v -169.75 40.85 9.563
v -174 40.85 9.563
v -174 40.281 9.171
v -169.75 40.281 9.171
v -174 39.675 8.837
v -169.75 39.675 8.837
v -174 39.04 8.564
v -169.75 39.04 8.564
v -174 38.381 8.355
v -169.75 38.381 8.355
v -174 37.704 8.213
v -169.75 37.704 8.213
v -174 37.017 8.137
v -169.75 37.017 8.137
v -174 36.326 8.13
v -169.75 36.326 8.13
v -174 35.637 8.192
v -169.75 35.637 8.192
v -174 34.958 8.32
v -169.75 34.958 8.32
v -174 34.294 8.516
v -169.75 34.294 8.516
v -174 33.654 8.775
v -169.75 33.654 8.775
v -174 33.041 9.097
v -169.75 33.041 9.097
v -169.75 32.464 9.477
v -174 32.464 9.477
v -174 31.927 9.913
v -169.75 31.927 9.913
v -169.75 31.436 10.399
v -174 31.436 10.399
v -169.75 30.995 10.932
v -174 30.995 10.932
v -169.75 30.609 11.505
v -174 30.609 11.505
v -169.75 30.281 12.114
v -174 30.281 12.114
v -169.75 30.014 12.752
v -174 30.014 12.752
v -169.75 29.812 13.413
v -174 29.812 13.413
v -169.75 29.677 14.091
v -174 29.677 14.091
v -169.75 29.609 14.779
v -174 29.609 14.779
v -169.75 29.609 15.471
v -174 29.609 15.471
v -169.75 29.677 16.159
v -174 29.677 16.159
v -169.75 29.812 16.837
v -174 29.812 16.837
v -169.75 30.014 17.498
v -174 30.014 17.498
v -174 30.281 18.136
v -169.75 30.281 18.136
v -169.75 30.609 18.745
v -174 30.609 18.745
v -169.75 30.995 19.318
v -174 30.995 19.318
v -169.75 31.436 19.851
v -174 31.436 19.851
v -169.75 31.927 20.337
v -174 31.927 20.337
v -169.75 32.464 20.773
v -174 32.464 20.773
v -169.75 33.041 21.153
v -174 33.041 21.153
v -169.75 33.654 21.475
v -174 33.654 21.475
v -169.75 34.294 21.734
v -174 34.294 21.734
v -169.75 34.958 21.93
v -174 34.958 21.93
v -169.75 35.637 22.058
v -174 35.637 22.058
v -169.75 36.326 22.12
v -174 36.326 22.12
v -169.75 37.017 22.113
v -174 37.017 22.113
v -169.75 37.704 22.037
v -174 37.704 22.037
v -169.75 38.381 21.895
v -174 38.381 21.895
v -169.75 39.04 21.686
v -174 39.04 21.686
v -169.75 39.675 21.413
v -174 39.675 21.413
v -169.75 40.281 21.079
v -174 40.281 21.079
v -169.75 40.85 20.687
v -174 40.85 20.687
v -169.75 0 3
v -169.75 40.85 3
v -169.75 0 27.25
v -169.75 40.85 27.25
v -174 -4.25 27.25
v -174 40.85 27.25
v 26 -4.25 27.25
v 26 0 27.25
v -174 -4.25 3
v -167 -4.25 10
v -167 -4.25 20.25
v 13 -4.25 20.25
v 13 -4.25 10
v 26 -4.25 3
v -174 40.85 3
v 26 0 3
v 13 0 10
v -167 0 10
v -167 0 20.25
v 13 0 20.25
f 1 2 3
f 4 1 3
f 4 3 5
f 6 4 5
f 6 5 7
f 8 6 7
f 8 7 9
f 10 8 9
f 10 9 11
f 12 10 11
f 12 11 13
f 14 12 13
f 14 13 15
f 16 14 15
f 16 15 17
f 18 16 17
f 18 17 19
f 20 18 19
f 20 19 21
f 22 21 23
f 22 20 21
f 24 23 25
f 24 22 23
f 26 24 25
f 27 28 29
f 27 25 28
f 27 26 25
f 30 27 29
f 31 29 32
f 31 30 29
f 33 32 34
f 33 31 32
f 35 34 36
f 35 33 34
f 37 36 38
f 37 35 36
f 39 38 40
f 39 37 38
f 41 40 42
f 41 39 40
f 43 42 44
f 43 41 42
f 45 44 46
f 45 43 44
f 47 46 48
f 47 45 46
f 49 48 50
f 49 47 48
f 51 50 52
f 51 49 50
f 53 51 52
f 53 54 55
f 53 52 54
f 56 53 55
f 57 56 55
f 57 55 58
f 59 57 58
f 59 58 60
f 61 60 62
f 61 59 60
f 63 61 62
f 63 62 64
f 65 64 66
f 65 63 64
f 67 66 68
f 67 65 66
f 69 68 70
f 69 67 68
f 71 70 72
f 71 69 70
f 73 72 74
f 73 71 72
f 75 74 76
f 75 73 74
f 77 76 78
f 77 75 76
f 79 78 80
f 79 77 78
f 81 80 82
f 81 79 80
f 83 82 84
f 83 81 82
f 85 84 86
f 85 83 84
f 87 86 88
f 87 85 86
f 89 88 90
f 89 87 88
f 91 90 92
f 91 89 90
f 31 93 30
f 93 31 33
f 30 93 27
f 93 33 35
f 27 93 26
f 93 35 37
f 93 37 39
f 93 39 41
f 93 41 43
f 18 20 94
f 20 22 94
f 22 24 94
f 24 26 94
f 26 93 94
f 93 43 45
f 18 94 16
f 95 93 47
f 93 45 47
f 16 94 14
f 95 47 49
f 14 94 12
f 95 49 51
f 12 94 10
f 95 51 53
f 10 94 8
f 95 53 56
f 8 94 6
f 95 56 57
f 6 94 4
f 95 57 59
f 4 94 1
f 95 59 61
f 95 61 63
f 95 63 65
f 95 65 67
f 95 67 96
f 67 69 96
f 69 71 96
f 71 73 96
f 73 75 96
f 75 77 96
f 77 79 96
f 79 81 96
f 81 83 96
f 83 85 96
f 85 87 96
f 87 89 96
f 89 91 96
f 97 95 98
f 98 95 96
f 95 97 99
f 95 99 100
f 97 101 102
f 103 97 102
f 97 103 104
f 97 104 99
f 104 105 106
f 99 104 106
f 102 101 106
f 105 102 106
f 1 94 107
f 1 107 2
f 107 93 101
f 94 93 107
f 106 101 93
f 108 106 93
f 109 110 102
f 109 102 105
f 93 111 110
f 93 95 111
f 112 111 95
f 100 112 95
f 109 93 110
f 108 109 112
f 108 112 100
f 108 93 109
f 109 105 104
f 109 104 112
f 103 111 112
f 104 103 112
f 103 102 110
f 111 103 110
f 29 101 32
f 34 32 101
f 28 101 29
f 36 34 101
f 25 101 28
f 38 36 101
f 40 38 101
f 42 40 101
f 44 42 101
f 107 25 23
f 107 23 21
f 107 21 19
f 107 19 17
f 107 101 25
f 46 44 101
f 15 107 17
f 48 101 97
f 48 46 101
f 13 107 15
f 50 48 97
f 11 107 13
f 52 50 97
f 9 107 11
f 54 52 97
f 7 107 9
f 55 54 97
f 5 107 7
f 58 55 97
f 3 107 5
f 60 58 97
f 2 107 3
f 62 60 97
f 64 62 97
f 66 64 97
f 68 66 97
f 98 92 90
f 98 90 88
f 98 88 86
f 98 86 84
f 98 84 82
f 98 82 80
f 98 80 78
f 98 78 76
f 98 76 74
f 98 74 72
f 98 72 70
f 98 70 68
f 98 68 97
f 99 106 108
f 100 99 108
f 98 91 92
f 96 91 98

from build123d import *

# Parameters (mm, degrees)
CYLINDER026_R     = 7
CYLINDER026_DEPTH = 64
BOX019_W          = 24.25
BOX019_H          = 40.85
BOX019_DEPTH      = 4.25
BOX026_W          = 180
BOX026_H          = 4.25
BOX026_DEPTH      = 10.25
BOX017_W          = 200
BOX017_H          = 4.25
BOX017_DEPTH      = 24.25


with BuildPart() as syringe2_cylinder001:
    # Cylinder026 → Cylinder026 (new body)
    with BuildSketch(Plane(origin=(-110, 36.6, 15.125), x_dir=(0, 0, 1), z_dir=(-1, 0, 0))):
        Circle(CYLINDER026_R)
    extrude(amount=CYLINDER026_DEPTH)


with BuildPart() as cube002:
    # Box019 → Box019 (new body)
    with BuildSketch(Plane(origin=(-169.75, 0, 3), x_dir=(0, 0, 1), z_dir=(-1, 0, 0))):
        with Locations((12.125, 20.425)):
            Rectangle(BOX019_W, BOX019_H)
    extrude(amount=BOX019_DEPTH)


with BuildPart() as cube003:
    # Box026 → Box026 (new body)
    with BuildSketch(Plane(origin=(-167, -4.25, 10), x_dir=(1, 0, 0), z_dir=(0, 0, 1))):
        with Locations((90, 2.125)):
            Rectangle(BOX026_W, BOX026_H)
    extrude(amount=BOX026_DEPTH)


with BuildPart() as cut006:
    # Box017 → Box017 (new body)
    with BuildSketch(Plane(origin=(-174, -4.25, 3), x_dir=(1, 0, 0), z_dir=(0, 0, 1))):
        with Locations((100, 2.125)):
            Rectangle(BOX017_W, BOX017_H)
    extrude(amount=BOX017_DEPTH)

    # Cut: cut Cube003
    add(cube003.part, mode=Mode.SUBTRACT)

    # Fusion: union Cube002
    add(cube002.part)

    # Cut006: cut syringe2_cylinder001
    add(syringe2_cylinder001.part, mode=Mode.SUBTRACT)


solid = cut006.part
